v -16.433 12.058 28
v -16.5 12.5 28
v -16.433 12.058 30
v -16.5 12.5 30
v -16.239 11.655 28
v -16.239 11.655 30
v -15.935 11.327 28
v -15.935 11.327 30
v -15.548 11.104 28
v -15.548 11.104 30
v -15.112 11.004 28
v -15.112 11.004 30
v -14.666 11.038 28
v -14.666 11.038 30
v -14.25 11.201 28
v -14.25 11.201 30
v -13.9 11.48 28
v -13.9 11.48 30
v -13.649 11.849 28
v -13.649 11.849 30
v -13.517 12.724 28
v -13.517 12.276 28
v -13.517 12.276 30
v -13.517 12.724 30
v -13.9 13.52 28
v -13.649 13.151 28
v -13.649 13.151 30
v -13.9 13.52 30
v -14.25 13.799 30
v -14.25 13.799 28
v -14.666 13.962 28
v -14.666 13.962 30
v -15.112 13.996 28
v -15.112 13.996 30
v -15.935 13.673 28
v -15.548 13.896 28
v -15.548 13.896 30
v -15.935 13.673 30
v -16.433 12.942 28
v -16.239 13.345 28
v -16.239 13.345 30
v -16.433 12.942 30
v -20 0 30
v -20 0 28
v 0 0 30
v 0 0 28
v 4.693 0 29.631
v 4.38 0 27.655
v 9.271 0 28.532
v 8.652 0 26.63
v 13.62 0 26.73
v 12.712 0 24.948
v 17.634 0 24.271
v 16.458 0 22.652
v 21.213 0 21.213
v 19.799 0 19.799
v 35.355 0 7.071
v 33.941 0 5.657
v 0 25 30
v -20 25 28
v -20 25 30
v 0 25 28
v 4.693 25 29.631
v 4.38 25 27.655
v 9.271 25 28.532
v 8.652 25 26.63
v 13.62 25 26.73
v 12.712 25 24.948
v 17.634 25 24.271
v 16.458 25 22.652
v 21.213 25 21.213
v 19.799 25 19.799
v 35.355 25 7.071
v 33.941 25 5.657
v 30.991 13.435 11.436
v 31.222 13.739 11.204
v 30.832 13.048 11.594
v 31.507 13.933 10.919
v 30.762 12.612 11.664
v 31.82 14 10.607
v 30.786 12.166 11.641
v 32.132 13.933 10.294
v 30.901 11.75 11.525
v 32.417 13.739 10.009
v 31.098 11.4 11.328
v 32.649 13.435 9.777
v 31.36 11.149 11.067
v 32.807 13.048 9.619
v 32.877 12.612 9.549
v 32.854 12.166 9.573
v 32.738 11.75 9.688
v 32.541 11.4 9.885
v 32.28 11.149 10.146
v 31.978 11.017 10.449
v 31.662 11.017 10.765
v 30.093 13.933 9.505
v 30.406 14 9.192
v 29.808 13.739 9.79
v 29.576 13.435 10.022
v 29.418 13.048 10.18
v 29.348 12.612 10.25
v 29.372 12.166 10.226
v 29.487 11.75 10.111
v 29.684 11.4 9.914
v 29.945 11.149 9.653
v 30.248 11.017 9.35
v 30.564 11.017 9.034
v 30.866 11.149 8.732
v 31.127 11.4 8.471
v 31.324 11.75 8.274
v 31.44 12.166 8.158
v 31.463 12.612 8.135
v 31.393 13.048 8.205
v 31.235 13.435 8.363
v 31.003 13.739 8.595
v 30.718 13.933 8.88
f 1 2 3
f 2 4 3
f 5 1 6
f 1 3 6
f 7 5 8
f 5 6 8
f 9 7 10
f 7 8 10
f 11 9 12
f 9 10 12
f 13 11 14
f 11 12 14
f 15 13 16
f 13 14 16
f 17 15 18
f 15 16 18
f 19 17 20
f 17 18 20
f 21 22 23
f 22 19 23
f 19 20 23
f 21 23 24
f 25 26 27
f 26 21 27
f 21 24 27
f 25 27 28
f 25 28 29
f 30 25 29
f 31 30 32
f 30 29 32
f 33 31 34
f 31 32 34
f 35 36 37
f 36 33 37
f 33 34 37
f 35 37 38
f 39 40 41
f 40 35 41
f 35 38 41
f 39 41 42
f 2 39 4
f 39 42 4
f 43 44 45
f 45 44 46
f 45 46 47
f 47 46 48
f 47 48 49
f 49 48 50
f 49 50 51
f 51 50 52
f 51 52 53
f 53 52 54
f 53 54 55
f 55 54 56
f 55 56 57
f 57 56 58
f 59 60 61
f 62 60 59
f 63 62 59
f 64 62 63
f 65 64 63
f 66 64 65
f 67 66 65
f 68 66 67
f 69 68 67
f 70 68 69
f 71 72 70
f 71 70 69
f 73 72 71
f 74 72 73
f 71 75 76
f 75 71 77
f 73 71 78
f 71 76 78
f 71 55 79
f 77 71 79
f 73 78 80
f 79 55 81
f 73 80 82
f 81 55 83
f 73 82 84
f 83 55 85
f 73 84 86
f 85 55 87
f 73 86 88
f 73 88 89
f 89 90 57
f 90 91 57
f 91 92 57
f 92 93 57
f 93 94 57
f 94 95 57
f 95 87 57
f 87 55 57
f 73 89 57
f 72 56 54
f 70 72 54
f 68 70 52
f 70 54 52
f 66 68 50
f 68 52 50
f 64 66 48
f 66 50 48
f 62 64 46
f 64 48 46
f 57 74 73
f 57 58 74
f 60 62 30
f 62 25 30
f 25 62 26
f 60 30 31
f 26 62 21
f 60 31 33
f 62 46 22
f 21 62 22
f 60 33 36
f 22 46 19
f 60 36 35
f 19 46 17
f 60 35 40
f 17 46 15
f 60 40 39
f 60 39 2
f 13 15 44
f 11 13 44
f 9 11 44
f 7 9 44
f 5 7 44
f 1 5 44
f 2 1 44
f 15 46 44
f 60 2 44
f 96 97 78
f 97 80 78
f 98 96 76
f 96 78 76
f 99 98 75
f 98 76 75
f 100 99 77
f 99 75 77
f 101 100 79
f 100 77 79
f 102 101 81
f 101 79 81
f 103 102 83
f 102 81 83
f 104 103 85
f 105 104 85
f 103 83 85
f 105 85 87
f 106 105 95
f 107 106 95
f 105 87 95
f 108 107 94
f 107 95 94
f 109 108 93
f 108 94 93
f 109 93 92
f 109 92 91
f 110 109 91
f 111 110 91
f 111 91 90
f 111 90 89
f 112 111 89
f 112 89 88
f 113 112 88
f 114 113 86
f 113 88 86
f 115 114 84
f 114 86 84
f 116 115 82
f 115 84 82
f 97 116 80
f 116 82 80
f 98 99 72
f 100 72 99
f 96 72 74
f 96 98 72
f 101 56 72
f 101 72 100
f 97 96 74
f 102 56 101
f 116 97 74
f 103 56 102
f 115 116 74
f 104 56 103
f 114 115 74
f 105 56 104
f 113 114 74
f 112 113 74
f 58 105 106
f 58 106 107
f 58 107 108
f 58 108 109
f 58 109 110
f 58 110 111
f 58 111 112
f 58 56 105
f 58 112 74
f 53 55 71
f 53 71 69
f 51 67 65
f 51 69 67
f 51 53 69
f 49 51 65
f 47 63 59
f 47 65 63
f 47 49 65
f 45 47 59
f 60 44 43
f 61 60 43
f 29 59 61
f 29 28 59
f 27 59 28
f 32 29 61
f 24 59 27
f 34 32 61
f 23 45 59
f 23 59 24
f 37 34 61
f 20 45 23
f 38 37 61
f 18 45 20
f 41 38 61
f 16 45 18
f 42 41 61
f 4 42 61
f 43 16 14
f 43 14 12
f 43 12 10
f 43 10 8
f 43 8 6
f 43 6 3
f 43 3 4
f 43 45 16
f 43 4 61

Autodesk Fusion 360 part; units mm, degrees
sketch "Cross-section" plane through (0, 0, 0) normal (0, 1, 0) x (1, 0, 0)
  line L0 (0, 0) -> (0, -30) construction
  line L1 (0, 0) -> (21.2132, -21.2132) construction
  arc A0 (0, -30) -> (21.2132, -21.2132) centre (0, 0) ccw
  line L2 (0, -30) -> (-20, -30)
  line L3 (21.2132, -21.2132) -> (35.3553, -7.0711)
  line L4 (19.799, -19.799) -> (33.9411, -5.6569)
  arc A1 (0, -28) -> (19.799, -19.799) centre (0, 0) ccw
  line L5 (0, -28) -> (-20, -28)
  line L6 (-20, -28) -> (-20, -30)
  line L7 (33.9411, -5.6569) -> (35.3553, -7.0711)
  line L8 (0, -29) -> (-15, -29)
  line L9 (21.2132, -21.2132) -> (31.8198, -10.6066)
  dimension "d1" = 60
  dimension "d2" = 45
  dimension "d3" = 20
  dimension "d4" = 20
  dimension "d5" = -2
  dimension "d8" = 15
  dimension "d9" = 15
extrude "Extrude1" add sketch "Cross-section" along normal blind 25
sketch "Mounting_hole_1" plane through (0, 0, 30) normal (0, 0, 1) x (-1, 0, 0)
  line L0 (20, 0) -> (0, 0)
  line L1 (0, 0) -> (0, -25)
  line L2 (0, -25) -> (20, -25)
  line L3 (20, -25) -> (20, 0)
  line L4 (0, -12.5) -> (15, -12.5)
  circle A0 centre (15, -12.5) radius 1.5
  dimension "d10" = 15
  dimension "d11" = 3
extrude "Extrude2" cut sketch "Mounting_hole_1" against normal blind 6 contours A0
sketch "Mounting_hole_2" plane through (21.2132, 0, 21.2132) normal (0.7071, 0, 0.7071) x (0, 1, 0)
  line L0 (0, 0) -> (0, -20)
  line L1 (0, -20) -> (25, -20)
  line L2 (25, -20) -> (25, 0)
  line L3 (25, 0) -> (0, 0)
  line L4 (12.5, 0) -> (12.5, -15)
  circle A0 centre (12.5, -15) radius 1.5
  dimension "d14" = 15
  dimension "d15" = 3
extrude "Extrude3" cut sketch "Mounting_hole_2" against normal blind 8 contours A0
